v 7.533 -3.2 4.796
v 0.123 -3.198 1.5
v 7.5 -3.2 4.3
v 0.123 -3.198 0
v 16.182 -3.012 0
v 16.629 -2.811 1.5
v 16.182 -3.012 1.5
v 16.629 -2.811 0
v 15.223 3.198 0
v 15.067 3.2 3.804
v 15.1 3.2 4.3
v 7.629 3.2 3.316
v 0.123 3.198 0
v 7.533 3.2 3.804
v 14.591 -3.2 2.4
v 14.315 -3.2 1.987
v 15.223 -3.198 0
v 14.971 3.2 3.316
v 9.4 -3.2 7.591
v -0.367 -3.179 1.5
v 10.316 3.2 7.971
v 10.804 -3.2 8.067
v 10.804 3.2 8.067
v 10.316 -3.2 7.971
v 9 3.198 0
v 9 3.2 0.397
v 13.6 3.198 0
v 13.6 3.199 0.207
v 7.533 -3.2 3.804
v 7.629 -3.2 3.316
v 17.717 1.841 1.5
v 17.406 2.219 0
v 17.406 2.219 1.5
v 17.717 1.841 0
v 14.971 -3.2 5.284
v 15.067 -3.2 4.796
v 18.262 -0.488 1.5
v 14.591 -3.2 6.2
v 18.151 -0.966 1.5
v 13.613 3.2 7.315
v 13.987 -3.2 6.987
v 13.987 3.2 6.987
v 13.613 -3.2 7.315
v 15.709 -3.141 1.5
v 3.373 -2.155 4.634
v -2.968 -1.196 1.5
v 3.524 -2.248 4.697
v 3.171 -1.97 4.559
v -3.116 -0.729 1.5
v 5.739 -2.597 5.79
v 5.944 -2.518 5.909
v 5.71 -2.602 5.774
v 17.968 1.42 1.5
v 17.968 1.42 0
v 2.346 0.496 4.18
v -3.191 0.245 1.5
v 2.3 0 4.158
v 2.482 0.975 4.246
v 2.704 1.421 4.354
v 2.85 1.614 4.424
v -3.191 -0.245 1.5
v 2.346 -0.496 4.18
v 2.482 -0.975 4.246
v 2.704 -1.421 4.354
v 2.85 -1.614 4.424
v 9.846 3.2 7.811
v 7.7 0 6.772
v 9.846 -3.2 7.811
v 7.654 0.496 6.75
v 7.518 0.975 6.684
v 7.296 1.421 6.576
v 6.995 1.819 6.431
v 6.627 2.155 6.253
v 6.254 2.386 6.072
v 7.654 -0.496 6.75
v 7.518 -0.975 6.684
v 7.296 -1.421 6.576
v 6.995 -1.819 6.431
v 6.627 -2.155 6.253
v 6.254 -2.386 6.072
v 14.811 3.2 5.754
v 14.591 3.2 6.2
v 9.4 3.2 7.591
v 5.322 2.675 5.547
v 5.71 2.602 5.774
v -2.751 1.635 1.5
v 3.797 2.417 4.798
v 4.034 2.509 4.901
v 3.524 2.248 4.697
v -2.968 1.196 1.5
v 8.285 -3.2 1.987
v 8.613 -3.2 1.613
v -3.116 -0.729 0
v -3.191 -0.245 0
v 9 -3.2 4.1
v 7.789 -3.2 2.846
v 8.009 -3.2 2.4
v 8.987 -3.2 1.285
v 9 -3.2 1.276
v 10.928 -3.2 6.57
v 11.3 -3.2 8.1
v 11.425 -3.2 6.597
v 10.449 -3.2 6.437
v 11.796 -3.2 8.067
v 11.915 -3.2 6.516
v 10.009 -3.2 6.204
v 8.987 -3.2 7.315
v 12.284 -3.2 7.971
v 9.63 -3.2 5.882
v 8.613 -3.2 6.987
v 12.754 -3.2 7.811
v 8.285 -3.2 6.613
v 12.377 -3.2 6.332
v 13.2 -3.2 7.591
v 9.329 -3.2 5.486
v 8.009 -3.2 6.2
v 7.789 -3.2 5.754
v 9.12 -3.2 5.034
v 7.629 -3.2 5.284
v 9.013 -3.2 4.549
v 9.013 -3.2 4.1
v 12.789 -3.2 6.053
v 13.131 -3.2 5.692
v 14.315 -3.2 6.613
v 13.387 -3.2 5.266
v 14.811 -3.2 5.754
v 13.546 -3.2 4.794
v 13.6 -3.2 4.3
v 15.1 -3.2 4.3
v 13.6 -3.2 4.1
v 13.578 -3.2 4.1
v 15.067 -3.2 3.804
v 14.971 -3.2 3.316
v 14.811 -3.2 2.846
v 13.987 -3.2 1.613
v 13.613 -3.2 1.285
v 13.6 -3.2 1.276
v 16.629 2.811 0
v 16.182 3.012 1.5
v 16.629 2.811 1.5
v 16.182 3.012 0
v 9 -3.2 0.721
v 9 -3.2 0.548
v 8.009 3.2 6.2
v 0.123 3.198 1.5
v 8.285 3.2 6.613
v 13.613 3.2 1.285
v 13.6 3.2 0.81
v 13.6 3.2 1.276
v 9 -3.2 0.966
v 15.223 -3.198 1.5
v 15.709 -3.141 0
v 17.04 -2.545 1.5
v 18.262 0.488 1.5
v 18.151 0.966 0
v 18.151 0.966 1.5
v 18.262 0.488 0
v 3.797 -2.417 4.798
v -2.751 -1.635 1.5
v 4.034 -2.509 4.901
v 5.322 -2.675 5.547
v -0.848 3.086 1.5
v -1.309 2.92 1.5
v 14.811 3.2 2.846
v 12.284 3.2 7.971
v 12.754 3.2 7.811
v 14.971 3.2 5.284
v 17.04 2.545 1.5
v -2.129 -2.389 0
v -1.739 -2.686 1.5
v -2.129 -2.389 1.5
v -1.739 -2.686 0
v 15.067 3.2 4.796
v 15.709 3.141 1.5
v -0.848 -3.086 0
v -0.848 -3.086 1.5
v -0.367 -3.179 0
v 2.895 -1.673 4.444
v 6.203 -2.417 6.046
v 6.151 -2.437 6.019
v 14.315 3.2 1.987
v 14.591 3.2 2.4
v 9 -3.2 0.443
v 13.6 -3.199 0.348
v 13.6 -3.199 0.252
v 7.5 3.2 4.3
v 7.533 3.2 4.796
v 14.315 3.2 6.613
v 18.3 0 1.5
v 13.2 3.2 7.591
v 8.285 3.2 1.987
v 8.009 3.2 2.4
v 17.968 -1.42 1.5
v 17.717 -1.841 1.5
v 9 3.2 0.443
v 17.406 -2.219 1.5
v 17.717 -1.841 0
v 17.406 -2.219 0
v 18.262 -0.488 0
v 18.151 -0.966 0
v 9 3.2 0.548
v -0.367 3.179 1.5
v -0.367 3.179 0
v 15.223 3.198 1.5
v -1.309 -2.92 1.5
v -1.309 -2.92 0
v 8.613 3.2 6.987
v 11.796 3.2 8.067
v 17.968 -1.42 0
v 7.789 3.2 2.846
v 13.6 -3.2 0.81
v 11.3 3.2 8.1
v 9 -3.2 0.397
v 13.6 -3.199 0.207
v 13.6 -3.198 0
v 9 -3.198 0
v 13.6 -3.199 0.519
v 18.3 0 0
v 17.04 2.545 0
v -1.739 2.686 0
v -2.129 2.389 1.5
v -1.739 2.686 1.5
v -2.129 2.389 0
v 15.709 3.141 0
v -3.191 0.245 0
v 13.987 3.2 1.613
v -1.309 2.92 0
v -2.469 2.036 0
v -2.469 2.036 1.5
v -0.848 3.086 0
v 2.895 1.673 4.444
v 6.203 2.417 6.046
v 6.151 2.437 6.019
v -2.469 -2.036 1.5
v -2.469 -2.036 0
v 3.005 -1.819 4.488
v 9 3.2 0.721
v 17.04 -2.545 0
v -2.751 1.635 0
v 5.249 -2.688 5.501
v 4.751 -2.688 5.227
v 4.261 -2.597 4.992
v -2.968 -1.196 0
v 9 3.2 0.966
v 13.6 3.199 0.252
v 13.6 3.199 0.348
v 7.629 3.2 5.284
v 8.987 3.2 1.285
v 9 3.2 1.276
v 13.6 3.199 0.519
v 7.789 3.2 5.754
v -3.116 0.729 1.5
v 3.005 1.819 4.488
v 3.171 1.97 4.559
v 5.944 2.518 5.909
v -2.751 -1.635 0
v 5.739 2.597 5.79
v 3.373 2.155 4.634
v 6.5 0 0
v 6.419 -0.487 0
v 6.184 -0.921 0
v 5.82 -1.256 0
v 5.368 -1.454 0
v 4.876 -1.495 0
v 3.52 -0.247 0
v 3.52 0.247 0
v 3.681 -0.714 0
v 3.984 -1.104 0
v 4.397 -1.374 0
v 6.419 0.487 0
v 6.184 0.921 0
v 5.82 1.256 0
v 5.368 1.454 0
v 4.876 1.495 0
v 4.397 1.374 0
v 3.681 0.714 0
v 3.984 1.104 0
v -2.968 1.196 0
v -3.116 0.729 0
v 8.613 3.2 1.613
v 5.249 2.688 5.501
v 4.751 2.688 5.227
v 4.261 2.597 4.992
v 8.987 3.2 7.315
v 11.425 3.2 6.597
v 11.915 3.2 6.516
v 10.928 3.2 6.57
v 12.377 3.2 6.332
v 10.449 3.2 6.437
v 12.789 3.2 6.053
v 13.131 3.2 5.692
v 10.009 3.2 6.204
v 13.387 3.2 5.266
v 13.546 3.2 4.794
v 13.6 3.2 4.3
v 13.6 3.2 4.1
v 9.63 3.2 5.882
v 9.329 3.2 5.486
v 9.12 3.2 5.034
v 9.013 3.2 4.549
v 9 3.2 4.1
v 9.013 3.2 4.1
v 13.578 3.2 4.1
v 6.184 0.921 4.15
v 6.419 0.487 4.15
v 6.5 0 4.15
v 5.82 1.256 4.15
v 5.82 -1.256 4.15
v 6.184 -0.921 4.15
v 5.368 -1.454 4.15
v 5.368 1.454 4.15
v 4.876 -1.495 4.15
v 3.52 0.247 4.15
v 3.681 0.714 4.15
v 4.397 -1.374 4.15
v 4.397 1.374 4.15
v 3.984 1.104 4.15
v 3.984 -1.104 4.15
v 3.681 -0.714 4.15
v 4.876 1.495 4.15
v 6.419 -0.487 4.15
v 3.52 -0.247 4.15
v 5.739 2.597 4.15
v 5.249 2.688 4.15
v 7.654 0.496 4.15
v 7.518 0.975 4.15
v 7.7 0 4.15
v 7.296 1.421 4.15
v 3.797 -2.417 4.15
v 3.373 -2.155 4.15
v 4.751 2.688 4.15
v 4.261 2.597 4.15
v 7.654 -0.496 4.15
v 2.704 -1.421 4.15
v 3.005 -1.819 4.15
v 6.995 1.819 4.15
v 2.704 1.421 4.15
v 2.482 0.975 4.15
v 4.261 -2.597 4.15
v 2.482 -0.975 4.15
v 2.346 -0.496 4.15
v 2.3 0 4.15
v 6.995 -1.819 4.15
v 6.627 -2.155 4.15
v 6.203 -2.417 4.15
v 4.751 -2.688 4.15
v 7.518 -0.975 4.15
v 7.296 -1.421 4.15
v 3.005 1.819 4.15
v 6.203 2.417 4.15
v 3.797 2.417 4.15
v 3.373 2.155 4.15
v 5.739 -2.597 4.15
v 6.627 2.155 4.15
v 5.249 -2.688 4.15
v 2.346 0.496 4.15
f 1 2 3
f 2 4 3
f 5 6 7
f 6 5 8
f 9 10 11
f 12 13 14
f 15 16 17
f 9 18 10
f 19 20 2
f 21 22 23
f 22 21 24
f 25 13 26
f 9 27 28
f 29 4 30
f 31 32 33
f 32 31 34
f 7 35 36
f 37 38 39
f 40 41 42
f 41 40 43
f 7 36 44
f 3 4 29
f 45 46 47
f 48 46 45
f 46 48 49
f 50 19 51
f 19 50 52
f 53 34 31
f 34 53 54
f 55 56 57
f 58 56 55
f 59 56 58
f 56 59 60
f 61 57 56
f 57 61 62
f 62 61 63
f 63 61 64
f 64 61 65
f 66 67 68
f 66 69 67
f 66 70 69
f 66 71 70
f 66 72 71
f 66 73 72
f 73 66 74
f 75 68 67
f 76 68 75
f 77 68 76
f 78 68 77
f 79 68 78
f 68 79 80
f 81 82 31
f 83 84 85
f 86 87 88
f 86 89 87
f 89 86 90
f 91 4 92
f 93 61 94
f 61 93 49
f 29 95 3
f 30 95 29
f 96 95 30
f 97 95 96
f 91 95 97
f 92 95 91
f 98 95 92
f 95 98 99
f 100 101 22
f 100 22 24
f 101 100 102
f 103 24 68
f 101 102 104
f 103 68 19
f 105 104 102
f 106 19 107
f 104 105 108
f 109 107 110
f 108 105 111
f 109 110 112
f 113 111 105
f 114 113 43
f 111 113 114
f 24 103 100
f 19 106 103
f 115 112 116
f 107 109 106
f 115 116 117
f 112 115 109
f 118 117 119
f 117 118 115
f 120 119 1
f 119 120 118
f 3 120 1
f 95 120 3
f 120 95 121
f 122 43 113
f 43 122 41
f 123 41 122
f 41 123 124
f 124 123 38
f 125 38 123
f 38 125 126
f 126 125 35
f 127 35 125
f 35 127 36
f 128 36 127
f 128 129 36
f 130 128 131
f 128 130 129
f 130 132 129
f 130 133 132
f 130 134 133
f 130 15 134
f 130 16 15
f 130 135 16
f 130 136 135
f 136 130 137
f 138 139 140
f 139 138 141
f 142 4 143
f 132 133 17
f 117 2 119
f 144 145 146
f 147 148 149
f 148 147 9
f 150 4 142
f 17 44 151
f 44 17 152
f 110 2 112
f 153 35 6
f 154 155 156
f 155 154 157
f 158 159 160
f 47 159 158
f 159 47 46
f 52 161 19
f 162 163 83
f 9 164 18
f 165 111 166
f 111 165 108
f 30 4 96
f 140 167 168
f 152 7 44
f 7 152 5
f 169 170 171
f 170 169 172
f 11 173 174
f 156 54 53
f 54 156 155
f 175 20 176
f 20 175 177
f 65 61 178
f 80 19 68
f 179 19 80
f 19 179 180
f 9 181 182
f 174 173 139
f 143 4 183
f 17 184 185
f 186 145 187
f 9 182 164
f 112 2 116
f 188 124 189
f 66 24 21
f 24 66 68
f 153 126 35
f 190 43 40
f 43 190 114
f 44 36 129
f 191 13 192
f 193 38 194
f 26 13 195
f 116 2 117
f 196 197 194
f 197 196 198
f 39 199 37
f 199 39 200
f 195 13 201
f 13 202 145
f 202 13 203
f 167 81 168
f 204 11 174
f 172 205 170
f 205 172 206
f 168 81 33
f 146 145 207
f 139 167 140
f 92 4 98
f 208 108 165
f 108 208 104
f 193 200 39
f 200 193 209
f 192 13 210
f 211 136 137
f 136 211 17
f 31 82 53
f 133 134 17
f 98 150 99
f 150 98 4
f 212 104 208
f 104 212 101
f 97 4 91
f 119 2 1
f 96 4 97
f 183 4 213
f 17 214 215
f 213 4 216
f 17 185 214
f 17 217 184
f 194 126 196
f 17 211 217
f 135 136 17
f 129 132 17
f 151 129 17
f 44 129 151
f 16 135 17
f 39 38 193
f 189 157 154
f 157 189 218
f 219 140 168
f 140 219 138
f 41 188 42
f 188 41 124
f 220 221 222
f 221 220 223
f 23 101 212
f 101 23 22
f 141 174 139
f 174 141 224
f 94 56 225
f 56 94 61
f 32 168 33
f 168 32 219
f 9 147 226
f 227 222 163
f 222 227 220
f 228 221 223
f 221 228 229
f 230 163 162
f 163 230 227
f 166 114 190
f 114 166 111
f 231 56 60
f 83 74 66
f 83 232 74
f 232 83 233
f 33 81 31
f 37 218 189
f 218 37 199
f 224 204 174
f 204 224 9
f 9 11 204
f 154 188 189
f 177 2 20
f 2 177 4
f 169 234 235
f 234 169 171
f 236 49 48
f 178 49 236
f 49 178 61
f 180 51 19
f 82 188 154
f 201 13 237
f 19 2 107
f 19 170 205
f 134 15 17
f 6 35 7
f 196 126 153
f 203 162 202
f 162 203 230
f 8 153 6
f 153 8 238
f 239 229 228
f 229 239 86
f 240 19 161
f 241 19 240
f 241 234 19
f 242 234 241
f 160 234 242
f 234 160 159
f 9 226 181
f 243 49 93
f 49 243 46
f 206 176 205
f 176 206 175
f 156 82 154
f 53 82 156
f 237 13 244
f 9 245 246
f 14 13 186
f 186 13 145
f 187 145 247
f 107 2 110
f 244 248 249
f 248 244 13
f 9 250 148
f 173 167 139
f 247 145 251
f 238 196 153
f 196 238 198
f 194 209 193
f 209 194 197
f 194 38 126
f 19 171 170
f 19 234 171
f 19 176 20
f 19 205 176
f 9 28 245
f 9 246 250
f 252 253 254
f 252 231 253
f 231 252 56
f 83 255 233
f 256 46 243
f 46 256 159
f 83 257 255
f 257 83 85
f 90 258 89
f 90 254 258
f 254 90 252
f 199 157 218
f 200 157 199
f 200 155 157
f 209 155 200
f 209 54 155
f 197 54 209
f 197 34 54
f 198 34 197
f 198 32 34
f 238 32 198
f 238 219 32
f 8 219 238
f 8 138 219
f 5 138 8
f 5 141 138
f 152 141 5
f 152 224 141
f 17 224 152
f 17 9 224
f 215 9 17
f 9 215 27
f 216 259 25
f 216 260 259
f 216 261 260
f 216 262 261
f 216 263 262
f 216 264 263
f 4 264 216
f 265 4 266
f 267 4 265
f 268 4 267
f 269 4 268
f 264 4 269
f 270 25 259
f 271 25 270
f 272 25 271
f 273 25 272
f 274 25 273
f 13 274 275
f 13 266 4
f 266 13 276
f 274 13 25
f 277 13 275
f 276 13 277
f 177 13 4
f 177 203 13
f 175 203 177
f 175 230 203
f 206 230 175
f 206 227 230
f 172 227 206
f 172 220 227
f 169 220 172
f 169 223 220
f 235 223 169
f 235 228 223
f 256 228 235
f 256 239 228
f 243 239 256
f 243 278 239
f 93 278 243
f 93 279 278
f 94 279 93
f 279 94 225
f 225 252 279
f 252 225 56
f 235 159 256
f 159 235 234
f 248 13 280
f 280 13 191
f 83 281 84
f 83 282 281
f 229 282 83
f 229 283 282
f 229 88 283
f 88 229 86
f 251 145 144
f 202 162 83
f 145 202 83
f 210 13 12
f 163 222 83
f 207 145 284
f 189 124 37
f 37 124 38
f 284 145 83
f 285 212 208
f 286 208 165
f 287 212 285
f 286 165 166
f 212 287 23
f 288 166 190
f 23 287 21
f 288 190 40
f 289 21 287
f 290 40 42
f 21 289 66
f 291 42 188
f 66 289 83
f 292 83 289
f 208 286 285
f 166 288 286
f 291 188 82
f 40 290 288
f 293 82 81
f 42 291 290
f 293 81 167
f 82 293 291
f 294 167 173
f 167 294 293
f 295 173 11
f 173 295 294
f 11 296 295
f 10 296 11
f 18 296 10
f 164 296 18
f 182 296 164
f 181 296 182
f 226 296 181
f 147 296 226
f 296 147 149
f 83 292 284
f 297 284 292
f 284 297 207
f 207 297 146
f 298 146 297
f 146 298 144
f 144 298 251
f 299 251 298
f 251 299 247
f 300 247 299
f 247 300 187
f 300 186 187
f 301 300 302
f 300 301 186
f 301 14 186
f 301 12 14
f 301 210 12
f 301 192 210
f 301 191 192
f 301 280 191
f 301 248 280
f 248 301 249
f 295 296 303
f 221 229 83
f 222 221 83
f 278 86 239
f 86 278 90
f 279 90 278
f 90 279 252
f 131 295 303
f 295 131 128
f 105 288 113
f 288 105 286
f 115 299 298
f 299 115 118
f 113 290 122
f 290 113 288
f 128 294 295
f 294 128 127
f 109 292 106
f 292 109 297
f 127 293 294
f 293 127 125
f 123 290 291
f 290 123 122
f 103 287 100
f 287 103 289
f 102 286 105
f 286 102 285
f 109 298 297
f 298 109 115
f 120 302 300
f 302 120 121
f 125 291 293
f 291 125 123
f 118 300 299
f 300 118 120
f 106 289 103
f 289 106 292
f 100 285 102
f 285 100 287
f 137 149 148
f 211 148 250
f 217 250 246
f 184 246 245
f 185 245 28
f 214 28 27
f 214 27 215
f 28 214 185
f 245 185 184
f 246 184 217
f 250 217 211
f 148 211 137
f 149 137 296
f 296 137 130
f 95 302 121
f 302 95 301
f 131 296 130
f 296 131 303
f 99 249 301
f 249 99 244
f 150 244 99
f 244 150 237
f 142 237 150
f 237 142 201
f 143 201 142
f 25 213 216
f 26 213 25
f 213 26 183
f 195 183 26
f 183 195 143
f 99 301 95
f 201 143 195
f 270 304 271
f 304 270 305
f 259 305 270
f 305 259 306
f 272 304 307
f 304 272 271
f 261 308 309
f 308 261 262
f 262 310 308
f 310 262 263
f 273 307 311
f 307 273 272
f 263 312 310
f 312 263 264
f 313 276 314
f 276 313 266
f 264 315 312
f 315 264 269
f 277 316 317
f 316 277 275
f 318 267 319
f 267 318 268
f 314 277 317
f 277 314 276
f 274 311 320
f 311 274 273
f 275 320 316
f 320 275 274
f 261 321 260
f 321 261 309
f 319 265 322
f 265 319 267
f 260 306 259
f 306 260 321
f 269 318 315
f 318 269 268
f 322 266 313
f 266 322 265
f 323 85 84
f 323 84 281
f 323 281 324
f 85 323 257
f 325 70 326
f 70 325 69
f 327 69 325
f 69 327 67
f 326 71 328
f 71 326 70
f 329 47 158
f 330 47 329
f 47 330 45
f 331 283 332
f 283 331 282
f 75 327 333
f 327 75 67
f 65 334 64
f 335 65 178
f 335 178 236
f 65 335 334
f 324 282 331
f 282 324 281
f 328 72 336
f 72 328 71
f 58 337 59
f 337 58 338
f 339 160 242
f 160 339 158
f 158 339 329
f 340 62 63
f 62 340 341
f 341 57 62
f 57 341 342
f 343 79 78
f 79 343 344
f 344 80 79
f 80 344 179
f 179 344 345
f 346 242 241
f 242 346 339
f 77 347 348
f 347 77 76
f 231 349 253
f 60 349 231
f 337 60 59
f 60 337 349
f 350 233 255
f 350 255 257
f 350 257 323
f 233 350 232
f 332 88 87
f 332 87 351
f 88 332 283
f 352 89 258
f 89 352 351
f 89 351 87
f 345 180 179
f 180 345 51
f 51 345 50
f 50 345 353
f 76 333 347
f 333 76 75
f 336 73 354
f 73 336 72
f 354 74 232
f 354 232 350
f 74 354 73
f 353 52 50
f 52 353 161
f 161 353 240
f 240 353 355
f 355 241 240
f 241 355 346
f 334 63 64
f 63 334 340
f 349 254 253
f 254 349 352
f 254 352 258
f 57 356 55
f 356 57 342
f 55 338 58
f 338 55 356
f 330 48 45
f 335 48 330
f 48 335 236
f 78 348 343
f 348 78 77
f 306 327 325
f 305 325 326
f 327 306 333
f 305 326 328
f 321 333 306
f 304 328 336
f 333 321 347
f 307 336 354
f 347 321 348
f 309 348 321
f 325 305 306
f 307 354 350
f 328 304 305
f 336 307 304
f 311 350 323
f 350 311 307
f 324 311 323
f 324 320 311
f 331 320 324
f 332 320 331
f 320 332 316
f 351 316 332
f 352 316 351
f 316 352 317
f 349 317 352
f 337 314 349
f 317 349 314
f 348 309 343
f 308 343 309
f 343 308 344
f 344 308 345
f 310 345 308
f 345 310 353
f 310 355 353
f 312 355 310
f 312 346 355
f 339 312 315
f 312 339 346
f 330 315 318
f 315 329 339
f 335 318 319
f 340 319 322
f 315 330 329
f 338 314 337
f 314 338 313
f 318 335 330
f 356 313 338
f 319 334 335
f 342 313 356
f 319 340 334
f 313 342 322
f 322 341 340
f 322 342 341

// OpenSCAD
//Measurements.
wire_radius = 4.2 / 2;
screw_radius = 3 / 2; //M3 screw.
screw_head_radius = 5 / 2;

//Settings.
play = 0.2;
thickness = 1.5;
leverage = 5; //Some leverage at the other end to push against.
              //This allows carrying more weight without bending the clip.
extra_wire_height = 2; //Allow the wire to be not entirely squished against the desk.
screw_hole_thickness = 4.15; //Tune manually to make screw head sit flush.
$fs = 0.5;
$fa = 1;

//Calculations.
width = (screw_radius + thickness + play) * 2;
height = wire_radius * 2 + extra_wire_height + play + thickness;
wire_x = leverage + screw_head_radius + thickness + wire_radius + play;

//Design.
difference() {
	//Main body.
	hull() {
		cylinder(r=width / 2, h=thickness);
		translate([wire_x + wire_radius + play + thickness, 0, 0]) {
			cylinder(r=width / 2, h=thickness);
		}
		translate([wire_x, -width / 2, wire_radius + play + extra_wire_height]) {
			rotate([-90, 0, 0]) {
				cylinder(r=wire_radius + play + thickness, h=width);
			}
		}
	}

	//Hole for wire.
	translate([wire_x, -width / 2 - 1, wire_radius + play + extra_wire_height]) {
		rotate([-90, 0, 0]) {
			cylinder(r=wire_radius + play, h=width + 2);
		}
	}
	translate([wire_x - wire_radius - play, -width / 2 - 1, -1]) {
		cube([wire_radius * 2 + play * 2, width + 2, extra_wire_height + wire_radius + 1]);
	}

	//Hole for screw.
	translate([leverage, 0, -1]) {
		cylinder(r=screw_radius, h=height + 2);
	}
	translate([leverage, 0, screw_hole_thickness]) {
		cylinder(r=screw_head_radius + play, h=height + 2);
	}
}
